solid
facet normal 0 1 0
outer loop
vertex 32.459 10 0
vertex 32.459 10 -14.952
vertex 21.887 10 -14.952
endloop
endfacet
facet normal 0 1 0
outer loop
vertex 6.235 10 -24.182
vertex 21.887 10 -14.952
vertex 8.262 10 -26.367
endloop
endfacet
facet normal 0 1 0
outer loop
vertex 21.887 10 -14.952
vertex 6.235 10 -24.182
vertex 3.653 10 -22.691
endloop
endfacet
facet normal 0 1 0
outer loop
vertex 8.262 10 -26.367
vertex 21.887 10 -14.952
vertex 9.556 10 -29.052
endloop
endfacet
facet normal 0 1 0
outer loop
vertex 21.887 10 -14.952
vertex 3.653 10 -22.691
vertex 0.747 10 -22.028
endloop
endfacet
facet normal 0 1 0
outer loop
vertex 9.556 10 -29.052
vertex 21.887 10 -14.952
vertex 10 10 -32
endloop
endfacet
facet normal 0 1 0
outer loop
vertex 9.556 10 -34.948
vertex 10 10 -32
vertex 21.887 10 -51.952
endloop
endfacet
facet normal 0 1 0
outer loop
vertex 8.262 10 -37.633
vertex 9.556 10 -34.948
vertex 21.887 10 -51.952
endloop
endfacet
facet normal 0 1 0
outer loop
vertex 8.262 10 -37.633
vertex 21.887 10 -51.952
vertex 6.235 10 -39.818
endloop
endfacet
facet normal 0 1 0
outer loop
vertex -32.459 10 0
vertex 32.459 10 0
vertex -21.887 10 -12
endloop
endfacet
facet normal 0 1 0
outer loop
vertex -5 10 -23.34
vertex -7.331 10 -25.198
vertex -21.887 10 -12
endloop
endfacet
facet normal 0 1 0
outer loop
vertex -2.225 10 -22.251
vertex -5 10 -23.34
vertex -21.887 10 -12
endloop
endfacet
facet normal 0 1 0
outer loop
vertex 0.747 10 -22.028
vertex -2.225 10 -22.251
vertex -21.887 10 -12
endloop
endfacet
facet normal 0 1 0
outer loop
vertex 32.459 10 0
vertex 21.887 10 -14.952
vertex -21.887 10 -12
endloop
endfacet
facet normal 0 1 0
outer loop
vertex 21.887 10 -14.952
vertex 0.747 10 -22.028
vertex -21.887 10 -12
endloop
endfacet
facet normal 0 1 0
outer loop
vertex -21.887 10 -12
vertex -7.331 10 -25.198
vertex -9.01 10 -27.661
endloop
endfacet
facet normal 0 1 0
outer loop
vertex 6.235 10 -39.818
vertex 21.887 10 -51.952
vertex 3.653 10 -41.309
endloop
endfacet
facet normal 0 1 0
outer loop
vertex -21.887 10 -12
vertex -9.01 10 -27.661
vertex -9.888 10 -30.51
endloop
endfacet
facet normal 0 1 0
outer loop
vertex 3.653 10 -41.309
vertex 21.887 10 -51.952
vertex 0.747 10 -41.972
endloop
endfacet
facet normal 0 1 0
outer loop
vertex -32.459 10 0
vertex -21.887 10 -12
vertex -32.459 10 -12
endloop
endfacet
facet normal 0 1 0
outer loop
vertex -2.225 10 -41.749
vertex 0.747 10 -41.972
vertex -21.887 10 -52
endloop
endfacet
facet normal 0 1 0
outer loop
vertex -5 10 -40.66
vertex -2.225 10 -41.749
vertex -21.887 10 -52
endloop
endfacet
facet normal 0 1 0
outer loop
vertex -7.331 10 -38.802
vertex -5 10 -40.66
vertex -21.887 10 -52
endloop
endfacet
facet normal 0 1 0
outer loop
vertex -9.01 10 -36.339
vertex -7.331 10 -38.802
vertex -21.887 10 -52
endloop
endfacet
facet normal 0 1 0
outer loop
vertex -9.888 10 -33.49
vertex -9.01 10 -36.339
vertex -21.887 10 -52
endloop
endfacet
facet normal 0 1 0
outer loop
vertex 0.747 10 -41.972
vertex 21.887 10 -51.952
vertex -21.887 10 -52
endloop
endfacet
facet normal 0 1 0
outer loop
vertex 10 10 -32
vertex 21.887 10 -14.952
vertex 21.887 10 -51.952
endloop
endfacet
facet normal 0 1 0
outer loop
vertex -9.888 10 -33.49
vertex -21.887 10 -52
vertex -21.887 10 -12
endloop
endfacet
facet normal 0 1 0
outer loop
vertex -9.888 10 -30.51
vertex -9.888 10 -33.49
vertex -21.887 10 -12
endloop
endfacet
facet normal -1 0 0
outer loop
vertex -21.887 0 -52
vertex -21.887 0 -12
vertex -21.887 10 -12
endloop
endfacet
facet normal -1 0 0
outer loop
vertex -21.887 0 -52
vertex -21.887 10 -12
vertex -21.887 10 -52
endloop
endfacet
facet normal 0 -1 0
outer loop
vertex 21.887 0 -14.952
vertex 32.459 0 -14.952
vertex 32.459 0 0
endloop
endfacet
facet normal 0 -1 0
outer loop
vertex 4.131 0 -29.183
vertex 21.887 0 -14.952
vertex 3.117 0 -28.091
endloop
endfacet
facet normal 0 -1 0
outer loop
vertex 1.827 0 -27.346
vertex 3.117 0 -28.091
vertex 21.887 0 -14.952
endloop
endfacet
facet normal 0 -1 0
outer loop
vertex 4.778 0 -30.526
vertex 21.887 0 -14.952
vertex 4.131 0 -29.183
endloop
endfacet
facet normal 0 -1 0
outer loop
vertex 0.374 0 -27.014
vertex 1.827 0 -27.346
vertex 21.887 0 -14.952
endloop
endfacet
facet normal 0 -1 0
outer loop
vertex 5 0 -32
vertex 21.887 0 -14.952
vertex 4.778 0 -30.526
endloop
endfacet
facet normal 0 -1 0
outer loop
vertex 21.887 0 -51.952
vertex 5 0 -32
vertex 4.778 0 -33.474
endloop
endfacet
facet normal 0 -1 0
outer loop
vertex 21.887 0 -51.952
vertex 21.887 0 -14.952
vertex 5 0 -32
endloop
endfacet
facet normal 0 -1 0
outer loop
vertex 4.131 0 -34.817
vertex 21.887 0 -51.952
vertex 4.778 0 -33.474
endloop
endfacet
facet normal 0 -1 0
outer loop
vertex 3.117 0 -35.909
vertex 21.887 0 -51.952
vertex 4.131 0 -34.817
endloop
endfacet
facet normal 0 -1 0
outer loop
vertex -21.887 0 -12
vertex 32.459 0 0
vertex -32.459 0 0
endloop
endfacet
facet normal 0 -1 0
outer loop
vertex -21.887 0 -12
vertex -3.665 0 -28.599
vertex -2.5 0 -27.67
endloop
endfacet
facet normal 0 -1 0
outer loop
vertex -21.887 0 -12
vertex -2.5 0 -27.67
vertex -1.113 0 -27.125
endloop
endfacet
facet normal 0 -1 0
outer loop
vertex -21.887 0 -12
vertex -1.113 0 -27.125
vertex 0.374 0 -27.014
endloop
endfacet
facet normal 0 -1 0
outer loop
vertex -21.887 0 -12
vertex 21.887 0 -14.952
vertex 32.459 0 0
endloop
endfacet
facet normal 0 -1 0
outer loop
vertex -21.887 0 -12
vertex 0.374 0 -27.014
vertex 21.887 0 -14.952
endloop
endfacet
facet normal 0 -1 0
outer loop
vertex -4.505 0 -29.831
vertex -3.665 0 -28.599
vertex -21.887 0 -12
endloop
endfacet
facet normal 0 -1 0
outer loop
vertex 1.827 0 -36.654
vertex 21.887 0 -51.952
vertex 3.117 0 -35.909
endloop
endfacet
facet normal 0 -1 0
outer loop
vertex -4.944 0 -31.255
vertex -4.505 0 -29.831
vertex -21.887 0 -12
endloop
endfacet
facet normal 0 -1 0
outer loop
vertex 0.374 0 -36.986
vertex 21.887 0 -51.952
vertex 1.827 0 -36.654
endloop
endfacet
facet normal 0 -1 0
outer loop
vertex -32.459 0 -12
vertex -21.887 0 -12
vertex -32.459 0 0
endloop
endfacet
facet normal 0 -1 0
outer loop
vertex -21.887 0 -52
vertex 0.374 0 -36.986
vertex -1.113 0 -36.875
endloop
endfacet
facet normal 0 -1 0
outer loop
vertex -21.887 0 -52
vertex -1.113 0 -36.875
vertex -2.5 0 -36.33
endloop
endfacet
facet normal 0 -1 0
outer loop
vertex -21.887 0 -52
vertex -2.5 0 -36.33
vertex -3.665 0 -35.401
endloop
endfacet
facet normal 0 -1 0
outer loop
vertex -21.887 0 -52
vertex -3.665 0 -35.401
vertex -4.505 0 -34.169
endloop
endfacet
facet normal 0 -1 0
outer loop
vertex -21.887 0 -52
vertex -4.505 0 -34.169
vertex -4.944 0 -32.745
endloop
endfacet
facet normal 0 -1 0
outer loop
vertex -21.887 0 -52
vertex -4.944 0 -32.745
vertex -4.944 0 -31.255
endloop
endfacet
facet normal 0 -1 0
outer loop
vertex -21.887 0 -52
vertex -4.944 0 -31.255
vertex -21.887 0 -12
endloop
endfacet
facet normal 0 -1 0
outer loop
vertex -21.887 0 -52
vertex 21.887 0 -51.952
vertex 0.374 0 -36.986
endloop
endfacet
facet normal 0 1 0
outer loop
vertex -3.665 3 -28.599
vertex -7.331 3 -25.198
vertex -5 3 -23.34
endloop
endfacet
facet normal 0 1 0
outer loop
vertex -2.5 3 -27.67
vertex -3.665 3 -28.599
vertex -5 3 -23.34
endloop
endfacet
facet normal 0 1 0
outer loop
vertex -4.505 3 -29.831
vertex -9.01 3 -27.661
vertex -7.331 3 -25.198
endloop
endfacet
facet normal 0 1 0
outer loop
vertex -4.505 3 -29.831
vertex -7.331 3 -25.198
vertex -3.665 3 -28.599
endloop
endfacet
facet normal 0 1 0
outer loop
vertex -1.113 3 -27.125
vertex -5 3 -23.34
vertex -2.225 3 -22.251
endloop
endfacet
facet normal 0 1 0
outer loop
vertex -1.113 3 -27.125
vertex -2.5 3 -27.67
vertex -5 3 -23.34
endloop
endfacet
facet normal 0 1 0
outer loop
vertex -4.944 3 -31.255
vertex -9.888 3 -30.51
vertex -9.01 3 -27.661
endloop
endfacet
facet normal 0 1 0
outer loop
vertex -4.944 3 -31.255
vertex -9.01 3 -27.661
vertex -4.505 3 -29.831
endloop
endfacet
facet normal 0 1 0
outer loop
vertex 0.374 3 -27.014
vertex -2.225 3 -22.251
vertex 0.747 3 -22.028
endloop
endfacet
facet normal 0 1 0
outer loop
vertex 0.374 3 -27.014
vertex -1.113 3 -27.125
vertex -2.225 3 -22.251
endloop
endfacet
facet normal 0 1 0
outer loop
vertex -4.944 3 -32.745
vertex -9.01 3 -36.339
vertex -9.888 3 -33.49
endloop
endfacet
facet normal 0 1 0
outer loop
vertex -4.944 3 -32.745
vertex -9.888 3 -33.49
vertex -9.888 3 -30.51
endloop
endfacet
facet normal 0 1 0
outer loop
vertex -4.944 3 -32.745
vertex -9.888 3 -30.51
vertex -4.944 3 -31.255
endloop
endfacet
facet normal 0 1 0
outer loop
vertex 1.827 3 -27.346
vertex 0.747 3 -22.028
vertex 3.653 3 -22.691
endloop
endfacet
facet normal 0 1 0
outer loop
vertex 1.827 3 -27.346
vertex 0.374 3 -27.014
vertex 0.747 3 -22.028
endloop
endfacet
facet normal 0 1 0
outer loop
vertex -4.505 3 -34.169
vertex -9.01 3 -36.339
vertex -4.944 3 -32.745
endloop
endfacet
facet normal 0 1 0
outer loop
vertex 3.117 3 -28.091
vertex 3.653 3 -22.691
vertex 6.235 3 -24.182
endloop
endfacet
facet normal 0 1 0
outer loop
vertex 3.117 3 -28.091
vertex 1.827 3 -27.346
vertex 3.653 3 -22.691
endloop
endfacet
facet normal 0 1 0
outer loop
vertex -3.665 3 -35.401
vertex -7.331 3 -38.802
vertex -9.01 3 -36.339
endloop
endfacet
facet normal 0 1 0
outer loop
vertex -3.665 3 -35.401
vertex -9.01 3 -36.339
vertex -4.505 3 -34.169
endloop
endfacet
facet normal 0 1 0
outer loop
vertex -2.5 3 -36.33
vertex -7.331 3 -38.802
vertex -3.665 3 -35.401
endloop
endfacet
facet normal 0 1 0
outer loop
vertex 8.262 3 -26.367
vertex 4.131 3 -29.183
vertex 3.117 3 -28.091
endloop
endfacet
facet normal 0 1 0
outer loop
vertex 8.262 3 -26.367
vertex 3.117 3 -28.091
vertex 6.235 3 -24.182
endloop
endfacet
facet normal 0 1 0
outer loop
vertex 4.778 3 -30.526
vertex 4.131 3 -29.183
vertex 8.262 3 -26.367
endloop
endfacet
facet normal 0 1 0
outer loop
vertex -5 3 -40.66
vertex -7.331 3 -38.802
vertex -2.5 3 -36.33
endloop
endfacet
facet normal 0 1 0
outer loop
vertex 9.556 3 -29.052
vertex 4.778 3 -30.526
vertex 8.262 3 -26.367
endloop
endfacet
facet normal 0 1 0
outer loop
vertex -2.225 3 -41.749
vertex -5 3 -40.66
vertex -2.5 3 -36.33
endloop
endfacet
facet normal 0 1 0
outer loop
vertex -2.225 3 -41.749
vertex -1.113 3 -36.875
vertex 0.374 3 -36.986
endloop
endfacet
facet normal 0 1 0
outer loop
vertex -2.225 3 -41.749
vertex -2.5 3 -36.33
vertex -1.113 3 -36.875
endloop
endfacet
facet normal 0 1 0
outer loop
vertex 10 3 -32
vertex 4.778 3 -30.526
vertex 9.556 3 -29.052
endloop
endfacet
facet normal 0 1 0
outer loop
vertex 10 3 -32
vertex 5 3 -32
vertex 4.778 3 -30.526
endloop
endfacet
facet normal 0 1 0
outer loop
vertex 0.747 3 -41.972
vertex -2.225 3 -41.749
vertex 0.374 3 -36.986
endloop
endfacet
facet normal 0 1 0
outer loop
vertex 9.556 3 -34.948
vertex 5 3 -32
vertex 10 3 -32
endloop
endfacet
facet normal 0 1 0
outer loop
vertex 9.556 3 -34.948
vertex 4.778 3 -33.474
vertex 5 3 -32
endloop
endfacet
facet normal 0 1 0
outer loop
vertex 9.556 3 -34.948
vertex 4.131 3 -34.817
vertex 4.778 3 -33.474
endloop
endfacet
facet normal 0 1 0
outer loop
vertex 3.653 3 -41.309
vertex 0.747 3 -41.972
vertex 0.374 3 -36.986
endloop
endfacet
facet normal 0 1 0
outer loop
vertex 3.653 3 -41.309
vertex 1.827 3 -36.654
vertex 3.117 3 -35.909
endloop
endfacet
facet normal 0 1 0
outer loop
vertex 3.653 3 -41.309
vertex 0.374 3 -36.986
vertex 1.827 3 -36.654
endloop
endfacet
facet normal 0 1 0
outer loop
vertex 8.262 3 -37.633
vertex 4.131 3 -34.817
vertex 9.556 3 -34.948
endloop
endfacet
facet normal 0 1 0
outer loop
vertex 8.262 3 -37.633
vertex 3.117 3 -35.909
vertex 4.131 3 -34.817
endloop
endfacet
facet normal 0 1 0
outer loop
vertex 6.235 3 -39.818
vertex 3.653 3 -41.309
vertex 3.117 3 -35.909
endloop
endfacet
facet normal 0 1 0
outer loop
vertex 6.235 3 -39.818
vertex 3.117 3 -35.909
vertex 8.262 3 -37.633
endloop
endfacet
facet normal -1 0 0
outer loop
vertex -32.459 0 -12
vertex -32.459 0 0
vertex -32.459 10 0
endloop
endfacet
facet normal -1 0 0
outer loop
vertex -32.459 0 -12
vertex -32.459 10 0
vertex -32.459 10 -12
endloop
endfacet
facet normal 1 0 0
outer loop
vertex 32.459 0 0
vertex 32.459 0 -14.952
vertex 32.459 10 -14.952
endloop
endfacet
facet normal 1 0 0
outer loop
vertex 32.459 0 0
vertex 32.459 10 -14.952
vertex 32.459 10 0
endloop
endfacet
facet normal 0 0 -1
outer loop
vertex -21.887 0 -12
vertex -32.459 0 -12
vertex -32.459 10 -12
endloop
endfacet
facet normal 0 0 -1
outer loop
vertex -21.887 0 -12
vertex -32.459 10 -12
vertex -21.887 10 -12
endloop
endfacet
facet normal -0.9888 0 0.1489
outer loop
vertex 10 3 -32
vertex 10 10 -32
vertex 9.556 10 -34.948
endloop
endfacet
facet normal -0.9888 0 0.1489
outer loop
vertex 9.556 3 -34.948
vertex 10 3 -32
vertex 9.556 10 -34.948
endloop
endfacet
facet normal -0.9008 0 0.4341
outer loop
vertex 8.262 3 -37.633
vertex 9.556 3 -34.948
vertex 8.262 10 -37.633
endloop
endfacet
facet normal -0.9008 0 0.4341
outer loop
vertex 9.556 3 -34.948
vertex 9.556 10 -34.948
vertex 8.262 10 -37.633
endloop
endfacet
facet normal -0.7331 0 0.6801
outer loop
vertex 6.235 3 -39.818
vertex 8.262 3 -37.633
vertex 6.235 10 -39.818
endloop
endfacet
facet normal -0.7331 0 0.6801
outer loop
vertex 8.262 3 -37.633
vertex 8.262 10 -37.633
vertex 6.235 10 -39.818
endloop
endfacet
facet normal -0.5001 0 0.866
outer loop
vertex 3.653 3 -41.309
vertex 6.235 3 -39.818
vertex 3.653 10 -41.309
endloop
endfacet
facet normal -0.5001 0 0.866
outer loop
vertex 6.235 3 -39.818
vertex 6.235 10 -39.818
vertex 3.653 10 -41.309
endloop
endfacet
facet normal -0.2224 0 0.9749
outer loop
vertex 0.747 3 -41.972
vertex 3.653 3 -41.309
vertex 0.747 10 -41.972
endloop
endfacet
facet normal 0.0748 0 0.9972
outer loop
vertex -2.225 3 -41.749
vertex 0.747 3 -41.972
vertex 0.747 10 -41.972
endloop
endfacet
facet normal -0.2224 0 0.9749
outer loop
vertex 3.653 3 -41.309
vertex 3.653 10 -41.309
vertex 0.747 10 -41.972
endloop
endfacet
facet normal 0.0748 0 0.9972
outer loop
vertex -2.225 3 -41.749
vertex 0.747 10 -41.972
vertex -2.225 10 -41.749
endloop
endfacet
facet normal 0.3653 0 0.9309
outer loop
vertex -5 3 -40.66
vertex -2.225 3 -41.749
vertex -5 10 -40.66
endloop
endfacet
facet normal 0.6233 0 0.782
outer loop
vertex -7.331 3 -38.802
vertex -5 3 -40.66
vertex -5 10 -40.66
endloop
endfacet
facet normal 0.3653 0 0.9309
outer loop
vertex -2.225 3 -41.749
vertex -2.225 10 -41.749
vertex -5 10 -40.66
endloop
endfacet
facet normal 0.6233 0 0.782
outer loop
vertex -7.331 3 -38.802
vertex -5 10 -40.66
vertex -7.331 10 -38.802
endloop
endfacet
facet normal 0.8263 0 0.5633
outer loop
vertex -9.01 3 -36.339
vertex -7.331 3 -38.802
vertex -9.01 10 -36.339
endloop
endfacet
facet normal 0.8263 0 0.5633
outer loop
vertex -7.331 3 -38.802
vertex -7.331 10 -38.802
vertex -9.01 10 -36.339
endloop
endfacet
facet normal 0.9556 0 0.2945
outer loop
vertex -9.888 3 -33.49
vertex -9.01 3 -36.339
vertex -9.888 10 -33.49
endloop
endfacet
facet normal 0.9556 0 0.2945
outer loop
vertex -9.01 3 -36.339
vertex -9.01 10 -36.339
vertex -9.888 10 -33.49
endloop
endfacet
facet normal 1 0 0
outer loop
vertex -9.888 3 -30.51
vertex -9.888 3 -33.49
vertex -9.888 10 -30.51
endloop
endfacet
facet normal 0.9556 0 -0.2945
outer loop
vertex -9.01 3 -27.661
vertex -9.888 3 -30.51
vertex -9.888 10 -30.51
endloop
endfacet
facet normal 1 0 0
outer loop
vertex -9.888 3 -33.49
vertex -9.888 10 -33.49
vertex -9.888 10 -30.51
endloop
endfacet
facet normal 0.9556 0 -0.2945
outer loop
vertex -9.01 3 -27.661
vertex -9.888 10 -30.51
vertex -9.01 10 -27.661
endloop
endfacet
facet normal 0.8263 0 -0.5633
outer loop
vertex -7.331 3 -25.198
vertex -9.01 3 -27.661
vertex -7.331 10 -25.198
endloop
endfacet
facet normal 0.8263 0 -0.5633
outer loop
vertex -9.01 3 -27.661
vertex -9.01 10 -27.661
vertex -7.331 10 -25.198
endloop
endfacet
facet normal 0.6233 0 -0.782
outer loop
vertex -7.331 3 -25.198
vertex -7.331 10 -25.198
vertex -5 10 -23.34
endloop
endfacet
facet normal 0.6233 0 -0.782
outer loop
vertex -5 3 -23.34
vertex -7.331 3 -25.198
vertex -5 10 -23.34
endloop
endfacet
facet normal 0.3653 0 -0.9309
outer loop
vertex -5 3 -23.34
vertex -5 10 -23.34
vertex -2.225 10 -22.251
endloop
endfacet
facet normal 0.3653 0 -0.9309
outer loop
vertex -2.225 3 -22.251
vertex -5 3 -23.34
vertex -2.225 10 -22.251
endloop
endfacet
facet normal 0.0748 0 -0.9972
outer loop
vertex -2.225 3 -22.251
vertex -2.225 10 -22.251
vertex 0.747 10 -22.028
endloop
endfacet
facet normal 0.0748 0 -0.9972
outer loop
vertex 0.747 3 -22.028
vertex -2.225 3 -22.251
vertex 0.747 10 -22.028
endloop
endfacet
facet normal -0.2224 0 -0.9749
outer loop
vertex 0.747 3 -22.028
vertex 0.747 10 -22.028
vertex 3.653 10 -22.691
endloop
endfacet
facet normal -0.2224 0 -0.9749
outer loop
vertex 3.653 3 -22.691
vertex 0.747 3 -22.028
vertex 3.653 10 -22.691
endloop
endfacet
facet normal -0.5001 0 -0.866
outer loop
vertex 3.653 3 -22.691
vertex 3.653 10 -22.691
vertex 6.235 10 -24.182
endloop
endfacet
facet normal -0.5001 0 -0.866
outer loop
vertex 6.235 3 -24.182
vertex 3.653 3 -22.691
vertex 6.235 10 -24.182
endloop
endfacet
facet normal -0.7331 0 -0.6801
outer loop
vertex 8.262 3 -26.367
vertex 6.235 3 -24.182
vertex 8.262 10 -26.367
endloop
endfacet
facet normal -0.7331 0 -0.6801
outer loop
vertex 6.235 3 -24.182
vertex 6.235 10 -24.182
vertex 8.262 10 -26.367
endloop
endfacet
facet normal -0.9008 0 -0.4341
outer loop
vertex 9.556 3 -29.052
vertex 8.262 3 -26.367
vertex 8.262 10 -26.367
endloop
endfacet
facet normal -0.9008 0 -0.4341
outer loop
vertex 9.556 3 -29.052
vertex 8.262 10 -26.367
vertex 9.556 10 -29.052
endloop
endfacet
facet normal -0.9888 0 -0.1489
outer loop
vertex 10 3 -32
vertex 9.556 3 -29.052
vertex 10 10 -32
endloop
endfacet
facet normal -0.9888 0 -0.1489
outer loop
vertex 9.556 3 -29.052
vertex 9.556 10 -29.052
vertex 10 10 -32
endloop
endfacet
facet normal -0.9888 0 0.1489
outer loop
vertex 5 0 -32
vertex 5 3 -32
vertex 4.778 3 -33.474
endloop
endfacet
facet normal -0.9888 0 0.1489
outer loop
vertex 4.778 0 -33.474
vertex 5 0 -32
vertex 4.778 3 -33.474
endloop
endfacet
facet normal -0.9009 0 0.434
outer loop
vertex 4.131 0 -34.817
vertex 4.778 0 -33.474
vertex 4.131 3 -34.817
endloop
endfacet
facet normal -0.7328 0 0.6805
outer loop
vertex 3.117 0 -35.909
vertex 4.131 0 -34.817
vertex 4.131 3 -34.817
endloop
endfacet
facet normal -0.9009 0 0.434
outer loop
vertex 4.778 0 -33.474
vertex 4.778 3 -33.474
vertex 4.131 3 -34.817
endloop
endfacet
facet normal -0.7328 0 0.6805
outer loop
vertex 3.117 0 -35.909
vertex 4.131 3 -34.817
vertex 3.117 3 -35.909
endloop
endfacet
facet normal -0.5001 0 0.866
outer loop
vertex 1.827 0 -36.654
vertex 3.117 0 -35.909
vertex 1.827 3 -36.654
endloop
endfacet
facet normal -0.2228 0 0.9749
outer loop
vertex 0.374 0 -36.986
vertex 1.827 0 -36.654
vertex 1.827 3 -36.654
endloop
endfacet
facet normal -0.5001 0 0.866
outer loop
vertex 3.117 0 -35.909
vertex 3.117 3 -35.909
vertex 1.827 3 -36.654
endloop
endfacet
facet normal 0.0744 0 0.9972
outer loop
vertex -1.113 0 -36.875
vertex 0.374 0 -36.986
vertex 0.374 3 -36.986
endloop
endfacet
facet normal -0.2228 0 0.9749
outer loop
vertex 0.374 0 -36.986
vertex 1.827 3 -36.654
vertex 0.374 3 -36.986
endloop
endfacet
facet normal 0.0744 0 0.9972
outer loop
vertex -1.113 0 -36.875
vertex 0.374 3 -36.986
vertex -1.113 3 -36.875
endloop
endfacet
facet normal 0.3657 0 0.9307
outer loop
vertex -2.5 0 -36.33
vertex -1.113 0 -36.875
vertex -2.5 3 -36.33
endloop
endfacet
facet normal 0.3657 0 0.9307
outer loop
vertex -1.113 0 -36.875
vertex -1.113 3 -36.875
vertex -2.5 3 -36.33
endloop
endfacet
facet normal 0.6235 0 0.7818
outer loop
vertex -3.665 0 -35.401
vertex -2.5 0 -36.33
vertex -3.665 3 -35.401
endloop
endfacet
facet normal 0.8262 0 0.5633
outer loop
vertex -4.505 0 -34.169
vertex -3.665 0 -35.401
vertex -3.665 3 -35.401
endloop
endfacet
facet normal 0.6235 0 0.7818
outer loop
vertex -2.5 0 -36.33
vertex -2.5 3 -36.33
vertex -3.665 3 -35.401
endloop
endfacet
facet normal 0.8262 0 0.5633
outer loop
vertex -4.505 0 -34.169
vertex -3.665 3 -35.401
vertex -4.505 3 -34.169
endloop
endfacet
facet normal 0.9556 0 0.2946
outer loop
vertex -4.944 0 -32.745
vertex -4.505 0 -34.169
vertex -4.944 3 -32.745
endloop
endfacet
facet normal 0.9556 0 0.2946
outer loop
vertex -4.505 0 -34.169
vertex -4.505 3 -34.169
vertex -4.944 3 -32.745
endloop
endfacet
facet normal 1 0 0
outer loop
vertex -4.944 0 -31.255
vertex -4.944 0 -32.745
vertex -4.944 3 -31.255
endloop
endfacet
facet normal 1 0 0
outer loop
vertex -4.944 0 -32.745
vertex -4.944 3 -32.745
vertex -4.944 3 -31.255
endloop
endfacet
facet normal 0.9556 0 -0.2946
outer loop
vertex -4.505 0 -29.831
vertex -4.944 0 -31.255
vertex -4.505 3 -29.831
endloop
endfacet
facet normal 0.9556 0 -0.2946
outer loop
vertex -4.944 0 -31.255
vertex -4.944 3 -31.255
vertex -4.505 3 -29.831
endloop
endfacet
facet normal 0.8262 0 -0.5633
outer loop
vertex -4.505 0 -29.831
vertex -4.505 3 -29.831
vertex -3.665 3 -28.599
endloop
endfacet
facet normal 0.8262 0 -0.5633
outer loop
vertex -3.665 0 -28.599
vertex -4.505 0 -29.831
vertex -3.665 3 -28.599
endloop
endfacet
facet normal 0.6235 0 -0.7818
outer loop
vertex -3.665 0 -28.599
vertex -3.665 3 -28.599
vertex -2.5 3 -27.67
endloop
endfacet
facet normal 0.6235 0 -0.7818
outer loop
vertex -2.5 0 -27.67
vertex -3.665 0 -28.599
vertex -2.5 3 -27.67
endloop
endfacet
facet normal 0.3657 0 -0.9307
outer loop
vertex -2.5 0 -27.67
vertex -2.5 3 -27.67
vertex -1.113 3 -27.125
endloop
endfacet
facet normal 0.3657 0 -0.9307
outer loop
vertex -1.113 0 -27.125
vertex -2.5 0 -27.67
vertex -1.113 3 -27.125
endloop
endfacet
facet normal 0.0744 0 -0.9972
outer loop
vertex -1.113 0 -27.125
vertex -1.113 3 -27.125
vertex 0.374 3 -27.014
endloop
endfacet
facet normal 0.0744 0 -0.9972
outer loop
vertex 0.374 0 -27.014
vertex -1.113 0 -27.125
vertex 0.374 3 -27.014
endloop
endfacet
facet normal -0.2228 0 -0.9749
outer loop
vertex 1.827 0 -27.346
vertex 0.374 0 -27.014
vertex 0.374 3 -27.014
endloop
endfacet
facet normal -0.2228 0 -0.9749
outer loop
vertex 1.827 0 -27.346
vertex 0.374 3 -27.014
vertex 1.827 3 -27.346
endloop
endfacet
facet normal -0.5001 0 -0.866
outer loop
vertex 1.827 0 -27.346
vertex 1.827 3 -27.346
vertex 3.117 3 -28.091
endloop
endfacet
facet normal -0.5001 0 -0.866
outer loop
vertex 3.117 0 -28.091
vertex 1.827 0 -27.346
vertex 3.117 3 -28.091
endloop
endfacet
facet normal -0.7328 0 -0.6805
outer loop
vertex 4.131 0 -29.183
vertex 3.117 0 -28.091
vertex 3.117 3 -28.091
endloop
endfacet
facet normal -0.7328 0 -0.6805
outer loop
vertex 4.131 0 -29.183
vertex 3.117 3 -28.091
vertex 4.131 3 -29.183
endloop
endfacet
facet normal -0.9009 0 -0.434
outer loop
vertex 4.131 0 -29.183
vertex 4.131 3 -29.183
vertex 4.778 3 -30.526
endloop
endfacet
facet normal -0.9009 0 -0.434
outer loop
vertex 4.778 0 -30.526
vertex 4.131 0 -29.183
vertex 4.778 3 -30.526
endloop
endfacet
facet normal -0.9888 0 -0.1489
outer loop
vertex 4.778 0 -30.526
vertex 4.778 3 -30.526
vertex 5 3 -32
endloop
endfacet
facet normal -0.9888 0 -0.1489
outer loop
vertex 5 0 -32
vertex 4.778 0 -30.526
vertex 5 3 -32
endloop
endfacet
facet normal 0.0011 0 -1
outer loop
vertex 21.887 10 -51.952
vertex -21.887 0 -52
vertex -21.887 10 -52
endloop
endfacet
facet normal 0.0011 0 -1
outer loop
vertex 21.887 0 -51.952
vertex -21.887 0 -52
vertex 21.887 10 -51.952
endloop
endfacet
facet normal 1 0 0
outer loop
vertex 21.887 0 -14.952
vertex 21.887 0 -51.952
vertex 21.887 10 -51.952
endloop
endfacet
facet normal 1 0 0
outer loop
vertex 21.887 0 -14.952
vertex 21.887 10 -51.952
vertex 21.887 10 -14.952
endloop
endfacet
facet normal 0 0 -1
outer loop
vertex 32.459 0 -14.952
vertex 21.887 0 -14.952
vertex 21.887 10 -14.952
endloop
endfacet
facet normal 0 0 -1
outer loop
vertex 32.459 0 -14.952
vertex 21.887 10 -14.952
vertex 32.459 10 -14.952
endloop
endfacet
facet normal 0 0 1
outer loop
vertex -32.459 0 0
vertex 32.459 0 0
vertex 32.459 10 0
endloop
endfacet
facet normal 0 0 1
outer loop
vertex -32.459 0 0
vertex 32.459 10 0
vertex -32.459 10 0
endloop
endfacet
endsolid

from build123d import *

# Parameters (mm, degrees)
BOSS_EXTRUDE1_DEPTH = 10
SKETCH2_R           = 10
CUT_EXTRUDE2_DEPTH  = 7
SKETCH5_R           = 5
CUT_EXTRUDE3_DEPTH  = 4


with BuildPart() as part:
    # Sketch1 → Boss-Extrude1 (new body)
    with BuildSketch(Plane(origin=(0, 0, 0), x_dir=(1, 0, 0), z_dir=(0, 1, 0))):
        Polygon((-21.887133372, 52), (21.887133372, 51.952432224), (21.887133372, 14.952432224), (32.458561943, 14.952432224), (32.458561943, 0), (-32.458561943, 0), (-32.458561943, 12), (-21.887133372, 12), align=None)
    extrude(amount=BOSS_EXTRUDE1_DEPTH)

    # Sketch2 → Cut-Extrude2 (cut)
    with BuildSketch(Plane(origin=(0, 10, 0), x_dir=(1, 0, 0), z_dir=(0, 1, 0))):
        with Locations((0, 32)):
            Circle(SKETCH2_R)
    extrude(amount=-CUT_EXTRUDE2_DEPTH, mode=Mode.SUBTRACT)

    # Sketch5 → Cut-Extrude3 (cut, through all)
    with BuildSketch(Plane(origin=(0, 3, 0), x_dir=(1, 0, 0), z_dir=(0, 1, 0))):
        with Locations((0, 32)):
            Circle(SKETCH5_R)
    extrude(amount=-CUT_EXTRUDE3_DEPTH, mode=Mode.SUBTRACT)


solid = part.part
